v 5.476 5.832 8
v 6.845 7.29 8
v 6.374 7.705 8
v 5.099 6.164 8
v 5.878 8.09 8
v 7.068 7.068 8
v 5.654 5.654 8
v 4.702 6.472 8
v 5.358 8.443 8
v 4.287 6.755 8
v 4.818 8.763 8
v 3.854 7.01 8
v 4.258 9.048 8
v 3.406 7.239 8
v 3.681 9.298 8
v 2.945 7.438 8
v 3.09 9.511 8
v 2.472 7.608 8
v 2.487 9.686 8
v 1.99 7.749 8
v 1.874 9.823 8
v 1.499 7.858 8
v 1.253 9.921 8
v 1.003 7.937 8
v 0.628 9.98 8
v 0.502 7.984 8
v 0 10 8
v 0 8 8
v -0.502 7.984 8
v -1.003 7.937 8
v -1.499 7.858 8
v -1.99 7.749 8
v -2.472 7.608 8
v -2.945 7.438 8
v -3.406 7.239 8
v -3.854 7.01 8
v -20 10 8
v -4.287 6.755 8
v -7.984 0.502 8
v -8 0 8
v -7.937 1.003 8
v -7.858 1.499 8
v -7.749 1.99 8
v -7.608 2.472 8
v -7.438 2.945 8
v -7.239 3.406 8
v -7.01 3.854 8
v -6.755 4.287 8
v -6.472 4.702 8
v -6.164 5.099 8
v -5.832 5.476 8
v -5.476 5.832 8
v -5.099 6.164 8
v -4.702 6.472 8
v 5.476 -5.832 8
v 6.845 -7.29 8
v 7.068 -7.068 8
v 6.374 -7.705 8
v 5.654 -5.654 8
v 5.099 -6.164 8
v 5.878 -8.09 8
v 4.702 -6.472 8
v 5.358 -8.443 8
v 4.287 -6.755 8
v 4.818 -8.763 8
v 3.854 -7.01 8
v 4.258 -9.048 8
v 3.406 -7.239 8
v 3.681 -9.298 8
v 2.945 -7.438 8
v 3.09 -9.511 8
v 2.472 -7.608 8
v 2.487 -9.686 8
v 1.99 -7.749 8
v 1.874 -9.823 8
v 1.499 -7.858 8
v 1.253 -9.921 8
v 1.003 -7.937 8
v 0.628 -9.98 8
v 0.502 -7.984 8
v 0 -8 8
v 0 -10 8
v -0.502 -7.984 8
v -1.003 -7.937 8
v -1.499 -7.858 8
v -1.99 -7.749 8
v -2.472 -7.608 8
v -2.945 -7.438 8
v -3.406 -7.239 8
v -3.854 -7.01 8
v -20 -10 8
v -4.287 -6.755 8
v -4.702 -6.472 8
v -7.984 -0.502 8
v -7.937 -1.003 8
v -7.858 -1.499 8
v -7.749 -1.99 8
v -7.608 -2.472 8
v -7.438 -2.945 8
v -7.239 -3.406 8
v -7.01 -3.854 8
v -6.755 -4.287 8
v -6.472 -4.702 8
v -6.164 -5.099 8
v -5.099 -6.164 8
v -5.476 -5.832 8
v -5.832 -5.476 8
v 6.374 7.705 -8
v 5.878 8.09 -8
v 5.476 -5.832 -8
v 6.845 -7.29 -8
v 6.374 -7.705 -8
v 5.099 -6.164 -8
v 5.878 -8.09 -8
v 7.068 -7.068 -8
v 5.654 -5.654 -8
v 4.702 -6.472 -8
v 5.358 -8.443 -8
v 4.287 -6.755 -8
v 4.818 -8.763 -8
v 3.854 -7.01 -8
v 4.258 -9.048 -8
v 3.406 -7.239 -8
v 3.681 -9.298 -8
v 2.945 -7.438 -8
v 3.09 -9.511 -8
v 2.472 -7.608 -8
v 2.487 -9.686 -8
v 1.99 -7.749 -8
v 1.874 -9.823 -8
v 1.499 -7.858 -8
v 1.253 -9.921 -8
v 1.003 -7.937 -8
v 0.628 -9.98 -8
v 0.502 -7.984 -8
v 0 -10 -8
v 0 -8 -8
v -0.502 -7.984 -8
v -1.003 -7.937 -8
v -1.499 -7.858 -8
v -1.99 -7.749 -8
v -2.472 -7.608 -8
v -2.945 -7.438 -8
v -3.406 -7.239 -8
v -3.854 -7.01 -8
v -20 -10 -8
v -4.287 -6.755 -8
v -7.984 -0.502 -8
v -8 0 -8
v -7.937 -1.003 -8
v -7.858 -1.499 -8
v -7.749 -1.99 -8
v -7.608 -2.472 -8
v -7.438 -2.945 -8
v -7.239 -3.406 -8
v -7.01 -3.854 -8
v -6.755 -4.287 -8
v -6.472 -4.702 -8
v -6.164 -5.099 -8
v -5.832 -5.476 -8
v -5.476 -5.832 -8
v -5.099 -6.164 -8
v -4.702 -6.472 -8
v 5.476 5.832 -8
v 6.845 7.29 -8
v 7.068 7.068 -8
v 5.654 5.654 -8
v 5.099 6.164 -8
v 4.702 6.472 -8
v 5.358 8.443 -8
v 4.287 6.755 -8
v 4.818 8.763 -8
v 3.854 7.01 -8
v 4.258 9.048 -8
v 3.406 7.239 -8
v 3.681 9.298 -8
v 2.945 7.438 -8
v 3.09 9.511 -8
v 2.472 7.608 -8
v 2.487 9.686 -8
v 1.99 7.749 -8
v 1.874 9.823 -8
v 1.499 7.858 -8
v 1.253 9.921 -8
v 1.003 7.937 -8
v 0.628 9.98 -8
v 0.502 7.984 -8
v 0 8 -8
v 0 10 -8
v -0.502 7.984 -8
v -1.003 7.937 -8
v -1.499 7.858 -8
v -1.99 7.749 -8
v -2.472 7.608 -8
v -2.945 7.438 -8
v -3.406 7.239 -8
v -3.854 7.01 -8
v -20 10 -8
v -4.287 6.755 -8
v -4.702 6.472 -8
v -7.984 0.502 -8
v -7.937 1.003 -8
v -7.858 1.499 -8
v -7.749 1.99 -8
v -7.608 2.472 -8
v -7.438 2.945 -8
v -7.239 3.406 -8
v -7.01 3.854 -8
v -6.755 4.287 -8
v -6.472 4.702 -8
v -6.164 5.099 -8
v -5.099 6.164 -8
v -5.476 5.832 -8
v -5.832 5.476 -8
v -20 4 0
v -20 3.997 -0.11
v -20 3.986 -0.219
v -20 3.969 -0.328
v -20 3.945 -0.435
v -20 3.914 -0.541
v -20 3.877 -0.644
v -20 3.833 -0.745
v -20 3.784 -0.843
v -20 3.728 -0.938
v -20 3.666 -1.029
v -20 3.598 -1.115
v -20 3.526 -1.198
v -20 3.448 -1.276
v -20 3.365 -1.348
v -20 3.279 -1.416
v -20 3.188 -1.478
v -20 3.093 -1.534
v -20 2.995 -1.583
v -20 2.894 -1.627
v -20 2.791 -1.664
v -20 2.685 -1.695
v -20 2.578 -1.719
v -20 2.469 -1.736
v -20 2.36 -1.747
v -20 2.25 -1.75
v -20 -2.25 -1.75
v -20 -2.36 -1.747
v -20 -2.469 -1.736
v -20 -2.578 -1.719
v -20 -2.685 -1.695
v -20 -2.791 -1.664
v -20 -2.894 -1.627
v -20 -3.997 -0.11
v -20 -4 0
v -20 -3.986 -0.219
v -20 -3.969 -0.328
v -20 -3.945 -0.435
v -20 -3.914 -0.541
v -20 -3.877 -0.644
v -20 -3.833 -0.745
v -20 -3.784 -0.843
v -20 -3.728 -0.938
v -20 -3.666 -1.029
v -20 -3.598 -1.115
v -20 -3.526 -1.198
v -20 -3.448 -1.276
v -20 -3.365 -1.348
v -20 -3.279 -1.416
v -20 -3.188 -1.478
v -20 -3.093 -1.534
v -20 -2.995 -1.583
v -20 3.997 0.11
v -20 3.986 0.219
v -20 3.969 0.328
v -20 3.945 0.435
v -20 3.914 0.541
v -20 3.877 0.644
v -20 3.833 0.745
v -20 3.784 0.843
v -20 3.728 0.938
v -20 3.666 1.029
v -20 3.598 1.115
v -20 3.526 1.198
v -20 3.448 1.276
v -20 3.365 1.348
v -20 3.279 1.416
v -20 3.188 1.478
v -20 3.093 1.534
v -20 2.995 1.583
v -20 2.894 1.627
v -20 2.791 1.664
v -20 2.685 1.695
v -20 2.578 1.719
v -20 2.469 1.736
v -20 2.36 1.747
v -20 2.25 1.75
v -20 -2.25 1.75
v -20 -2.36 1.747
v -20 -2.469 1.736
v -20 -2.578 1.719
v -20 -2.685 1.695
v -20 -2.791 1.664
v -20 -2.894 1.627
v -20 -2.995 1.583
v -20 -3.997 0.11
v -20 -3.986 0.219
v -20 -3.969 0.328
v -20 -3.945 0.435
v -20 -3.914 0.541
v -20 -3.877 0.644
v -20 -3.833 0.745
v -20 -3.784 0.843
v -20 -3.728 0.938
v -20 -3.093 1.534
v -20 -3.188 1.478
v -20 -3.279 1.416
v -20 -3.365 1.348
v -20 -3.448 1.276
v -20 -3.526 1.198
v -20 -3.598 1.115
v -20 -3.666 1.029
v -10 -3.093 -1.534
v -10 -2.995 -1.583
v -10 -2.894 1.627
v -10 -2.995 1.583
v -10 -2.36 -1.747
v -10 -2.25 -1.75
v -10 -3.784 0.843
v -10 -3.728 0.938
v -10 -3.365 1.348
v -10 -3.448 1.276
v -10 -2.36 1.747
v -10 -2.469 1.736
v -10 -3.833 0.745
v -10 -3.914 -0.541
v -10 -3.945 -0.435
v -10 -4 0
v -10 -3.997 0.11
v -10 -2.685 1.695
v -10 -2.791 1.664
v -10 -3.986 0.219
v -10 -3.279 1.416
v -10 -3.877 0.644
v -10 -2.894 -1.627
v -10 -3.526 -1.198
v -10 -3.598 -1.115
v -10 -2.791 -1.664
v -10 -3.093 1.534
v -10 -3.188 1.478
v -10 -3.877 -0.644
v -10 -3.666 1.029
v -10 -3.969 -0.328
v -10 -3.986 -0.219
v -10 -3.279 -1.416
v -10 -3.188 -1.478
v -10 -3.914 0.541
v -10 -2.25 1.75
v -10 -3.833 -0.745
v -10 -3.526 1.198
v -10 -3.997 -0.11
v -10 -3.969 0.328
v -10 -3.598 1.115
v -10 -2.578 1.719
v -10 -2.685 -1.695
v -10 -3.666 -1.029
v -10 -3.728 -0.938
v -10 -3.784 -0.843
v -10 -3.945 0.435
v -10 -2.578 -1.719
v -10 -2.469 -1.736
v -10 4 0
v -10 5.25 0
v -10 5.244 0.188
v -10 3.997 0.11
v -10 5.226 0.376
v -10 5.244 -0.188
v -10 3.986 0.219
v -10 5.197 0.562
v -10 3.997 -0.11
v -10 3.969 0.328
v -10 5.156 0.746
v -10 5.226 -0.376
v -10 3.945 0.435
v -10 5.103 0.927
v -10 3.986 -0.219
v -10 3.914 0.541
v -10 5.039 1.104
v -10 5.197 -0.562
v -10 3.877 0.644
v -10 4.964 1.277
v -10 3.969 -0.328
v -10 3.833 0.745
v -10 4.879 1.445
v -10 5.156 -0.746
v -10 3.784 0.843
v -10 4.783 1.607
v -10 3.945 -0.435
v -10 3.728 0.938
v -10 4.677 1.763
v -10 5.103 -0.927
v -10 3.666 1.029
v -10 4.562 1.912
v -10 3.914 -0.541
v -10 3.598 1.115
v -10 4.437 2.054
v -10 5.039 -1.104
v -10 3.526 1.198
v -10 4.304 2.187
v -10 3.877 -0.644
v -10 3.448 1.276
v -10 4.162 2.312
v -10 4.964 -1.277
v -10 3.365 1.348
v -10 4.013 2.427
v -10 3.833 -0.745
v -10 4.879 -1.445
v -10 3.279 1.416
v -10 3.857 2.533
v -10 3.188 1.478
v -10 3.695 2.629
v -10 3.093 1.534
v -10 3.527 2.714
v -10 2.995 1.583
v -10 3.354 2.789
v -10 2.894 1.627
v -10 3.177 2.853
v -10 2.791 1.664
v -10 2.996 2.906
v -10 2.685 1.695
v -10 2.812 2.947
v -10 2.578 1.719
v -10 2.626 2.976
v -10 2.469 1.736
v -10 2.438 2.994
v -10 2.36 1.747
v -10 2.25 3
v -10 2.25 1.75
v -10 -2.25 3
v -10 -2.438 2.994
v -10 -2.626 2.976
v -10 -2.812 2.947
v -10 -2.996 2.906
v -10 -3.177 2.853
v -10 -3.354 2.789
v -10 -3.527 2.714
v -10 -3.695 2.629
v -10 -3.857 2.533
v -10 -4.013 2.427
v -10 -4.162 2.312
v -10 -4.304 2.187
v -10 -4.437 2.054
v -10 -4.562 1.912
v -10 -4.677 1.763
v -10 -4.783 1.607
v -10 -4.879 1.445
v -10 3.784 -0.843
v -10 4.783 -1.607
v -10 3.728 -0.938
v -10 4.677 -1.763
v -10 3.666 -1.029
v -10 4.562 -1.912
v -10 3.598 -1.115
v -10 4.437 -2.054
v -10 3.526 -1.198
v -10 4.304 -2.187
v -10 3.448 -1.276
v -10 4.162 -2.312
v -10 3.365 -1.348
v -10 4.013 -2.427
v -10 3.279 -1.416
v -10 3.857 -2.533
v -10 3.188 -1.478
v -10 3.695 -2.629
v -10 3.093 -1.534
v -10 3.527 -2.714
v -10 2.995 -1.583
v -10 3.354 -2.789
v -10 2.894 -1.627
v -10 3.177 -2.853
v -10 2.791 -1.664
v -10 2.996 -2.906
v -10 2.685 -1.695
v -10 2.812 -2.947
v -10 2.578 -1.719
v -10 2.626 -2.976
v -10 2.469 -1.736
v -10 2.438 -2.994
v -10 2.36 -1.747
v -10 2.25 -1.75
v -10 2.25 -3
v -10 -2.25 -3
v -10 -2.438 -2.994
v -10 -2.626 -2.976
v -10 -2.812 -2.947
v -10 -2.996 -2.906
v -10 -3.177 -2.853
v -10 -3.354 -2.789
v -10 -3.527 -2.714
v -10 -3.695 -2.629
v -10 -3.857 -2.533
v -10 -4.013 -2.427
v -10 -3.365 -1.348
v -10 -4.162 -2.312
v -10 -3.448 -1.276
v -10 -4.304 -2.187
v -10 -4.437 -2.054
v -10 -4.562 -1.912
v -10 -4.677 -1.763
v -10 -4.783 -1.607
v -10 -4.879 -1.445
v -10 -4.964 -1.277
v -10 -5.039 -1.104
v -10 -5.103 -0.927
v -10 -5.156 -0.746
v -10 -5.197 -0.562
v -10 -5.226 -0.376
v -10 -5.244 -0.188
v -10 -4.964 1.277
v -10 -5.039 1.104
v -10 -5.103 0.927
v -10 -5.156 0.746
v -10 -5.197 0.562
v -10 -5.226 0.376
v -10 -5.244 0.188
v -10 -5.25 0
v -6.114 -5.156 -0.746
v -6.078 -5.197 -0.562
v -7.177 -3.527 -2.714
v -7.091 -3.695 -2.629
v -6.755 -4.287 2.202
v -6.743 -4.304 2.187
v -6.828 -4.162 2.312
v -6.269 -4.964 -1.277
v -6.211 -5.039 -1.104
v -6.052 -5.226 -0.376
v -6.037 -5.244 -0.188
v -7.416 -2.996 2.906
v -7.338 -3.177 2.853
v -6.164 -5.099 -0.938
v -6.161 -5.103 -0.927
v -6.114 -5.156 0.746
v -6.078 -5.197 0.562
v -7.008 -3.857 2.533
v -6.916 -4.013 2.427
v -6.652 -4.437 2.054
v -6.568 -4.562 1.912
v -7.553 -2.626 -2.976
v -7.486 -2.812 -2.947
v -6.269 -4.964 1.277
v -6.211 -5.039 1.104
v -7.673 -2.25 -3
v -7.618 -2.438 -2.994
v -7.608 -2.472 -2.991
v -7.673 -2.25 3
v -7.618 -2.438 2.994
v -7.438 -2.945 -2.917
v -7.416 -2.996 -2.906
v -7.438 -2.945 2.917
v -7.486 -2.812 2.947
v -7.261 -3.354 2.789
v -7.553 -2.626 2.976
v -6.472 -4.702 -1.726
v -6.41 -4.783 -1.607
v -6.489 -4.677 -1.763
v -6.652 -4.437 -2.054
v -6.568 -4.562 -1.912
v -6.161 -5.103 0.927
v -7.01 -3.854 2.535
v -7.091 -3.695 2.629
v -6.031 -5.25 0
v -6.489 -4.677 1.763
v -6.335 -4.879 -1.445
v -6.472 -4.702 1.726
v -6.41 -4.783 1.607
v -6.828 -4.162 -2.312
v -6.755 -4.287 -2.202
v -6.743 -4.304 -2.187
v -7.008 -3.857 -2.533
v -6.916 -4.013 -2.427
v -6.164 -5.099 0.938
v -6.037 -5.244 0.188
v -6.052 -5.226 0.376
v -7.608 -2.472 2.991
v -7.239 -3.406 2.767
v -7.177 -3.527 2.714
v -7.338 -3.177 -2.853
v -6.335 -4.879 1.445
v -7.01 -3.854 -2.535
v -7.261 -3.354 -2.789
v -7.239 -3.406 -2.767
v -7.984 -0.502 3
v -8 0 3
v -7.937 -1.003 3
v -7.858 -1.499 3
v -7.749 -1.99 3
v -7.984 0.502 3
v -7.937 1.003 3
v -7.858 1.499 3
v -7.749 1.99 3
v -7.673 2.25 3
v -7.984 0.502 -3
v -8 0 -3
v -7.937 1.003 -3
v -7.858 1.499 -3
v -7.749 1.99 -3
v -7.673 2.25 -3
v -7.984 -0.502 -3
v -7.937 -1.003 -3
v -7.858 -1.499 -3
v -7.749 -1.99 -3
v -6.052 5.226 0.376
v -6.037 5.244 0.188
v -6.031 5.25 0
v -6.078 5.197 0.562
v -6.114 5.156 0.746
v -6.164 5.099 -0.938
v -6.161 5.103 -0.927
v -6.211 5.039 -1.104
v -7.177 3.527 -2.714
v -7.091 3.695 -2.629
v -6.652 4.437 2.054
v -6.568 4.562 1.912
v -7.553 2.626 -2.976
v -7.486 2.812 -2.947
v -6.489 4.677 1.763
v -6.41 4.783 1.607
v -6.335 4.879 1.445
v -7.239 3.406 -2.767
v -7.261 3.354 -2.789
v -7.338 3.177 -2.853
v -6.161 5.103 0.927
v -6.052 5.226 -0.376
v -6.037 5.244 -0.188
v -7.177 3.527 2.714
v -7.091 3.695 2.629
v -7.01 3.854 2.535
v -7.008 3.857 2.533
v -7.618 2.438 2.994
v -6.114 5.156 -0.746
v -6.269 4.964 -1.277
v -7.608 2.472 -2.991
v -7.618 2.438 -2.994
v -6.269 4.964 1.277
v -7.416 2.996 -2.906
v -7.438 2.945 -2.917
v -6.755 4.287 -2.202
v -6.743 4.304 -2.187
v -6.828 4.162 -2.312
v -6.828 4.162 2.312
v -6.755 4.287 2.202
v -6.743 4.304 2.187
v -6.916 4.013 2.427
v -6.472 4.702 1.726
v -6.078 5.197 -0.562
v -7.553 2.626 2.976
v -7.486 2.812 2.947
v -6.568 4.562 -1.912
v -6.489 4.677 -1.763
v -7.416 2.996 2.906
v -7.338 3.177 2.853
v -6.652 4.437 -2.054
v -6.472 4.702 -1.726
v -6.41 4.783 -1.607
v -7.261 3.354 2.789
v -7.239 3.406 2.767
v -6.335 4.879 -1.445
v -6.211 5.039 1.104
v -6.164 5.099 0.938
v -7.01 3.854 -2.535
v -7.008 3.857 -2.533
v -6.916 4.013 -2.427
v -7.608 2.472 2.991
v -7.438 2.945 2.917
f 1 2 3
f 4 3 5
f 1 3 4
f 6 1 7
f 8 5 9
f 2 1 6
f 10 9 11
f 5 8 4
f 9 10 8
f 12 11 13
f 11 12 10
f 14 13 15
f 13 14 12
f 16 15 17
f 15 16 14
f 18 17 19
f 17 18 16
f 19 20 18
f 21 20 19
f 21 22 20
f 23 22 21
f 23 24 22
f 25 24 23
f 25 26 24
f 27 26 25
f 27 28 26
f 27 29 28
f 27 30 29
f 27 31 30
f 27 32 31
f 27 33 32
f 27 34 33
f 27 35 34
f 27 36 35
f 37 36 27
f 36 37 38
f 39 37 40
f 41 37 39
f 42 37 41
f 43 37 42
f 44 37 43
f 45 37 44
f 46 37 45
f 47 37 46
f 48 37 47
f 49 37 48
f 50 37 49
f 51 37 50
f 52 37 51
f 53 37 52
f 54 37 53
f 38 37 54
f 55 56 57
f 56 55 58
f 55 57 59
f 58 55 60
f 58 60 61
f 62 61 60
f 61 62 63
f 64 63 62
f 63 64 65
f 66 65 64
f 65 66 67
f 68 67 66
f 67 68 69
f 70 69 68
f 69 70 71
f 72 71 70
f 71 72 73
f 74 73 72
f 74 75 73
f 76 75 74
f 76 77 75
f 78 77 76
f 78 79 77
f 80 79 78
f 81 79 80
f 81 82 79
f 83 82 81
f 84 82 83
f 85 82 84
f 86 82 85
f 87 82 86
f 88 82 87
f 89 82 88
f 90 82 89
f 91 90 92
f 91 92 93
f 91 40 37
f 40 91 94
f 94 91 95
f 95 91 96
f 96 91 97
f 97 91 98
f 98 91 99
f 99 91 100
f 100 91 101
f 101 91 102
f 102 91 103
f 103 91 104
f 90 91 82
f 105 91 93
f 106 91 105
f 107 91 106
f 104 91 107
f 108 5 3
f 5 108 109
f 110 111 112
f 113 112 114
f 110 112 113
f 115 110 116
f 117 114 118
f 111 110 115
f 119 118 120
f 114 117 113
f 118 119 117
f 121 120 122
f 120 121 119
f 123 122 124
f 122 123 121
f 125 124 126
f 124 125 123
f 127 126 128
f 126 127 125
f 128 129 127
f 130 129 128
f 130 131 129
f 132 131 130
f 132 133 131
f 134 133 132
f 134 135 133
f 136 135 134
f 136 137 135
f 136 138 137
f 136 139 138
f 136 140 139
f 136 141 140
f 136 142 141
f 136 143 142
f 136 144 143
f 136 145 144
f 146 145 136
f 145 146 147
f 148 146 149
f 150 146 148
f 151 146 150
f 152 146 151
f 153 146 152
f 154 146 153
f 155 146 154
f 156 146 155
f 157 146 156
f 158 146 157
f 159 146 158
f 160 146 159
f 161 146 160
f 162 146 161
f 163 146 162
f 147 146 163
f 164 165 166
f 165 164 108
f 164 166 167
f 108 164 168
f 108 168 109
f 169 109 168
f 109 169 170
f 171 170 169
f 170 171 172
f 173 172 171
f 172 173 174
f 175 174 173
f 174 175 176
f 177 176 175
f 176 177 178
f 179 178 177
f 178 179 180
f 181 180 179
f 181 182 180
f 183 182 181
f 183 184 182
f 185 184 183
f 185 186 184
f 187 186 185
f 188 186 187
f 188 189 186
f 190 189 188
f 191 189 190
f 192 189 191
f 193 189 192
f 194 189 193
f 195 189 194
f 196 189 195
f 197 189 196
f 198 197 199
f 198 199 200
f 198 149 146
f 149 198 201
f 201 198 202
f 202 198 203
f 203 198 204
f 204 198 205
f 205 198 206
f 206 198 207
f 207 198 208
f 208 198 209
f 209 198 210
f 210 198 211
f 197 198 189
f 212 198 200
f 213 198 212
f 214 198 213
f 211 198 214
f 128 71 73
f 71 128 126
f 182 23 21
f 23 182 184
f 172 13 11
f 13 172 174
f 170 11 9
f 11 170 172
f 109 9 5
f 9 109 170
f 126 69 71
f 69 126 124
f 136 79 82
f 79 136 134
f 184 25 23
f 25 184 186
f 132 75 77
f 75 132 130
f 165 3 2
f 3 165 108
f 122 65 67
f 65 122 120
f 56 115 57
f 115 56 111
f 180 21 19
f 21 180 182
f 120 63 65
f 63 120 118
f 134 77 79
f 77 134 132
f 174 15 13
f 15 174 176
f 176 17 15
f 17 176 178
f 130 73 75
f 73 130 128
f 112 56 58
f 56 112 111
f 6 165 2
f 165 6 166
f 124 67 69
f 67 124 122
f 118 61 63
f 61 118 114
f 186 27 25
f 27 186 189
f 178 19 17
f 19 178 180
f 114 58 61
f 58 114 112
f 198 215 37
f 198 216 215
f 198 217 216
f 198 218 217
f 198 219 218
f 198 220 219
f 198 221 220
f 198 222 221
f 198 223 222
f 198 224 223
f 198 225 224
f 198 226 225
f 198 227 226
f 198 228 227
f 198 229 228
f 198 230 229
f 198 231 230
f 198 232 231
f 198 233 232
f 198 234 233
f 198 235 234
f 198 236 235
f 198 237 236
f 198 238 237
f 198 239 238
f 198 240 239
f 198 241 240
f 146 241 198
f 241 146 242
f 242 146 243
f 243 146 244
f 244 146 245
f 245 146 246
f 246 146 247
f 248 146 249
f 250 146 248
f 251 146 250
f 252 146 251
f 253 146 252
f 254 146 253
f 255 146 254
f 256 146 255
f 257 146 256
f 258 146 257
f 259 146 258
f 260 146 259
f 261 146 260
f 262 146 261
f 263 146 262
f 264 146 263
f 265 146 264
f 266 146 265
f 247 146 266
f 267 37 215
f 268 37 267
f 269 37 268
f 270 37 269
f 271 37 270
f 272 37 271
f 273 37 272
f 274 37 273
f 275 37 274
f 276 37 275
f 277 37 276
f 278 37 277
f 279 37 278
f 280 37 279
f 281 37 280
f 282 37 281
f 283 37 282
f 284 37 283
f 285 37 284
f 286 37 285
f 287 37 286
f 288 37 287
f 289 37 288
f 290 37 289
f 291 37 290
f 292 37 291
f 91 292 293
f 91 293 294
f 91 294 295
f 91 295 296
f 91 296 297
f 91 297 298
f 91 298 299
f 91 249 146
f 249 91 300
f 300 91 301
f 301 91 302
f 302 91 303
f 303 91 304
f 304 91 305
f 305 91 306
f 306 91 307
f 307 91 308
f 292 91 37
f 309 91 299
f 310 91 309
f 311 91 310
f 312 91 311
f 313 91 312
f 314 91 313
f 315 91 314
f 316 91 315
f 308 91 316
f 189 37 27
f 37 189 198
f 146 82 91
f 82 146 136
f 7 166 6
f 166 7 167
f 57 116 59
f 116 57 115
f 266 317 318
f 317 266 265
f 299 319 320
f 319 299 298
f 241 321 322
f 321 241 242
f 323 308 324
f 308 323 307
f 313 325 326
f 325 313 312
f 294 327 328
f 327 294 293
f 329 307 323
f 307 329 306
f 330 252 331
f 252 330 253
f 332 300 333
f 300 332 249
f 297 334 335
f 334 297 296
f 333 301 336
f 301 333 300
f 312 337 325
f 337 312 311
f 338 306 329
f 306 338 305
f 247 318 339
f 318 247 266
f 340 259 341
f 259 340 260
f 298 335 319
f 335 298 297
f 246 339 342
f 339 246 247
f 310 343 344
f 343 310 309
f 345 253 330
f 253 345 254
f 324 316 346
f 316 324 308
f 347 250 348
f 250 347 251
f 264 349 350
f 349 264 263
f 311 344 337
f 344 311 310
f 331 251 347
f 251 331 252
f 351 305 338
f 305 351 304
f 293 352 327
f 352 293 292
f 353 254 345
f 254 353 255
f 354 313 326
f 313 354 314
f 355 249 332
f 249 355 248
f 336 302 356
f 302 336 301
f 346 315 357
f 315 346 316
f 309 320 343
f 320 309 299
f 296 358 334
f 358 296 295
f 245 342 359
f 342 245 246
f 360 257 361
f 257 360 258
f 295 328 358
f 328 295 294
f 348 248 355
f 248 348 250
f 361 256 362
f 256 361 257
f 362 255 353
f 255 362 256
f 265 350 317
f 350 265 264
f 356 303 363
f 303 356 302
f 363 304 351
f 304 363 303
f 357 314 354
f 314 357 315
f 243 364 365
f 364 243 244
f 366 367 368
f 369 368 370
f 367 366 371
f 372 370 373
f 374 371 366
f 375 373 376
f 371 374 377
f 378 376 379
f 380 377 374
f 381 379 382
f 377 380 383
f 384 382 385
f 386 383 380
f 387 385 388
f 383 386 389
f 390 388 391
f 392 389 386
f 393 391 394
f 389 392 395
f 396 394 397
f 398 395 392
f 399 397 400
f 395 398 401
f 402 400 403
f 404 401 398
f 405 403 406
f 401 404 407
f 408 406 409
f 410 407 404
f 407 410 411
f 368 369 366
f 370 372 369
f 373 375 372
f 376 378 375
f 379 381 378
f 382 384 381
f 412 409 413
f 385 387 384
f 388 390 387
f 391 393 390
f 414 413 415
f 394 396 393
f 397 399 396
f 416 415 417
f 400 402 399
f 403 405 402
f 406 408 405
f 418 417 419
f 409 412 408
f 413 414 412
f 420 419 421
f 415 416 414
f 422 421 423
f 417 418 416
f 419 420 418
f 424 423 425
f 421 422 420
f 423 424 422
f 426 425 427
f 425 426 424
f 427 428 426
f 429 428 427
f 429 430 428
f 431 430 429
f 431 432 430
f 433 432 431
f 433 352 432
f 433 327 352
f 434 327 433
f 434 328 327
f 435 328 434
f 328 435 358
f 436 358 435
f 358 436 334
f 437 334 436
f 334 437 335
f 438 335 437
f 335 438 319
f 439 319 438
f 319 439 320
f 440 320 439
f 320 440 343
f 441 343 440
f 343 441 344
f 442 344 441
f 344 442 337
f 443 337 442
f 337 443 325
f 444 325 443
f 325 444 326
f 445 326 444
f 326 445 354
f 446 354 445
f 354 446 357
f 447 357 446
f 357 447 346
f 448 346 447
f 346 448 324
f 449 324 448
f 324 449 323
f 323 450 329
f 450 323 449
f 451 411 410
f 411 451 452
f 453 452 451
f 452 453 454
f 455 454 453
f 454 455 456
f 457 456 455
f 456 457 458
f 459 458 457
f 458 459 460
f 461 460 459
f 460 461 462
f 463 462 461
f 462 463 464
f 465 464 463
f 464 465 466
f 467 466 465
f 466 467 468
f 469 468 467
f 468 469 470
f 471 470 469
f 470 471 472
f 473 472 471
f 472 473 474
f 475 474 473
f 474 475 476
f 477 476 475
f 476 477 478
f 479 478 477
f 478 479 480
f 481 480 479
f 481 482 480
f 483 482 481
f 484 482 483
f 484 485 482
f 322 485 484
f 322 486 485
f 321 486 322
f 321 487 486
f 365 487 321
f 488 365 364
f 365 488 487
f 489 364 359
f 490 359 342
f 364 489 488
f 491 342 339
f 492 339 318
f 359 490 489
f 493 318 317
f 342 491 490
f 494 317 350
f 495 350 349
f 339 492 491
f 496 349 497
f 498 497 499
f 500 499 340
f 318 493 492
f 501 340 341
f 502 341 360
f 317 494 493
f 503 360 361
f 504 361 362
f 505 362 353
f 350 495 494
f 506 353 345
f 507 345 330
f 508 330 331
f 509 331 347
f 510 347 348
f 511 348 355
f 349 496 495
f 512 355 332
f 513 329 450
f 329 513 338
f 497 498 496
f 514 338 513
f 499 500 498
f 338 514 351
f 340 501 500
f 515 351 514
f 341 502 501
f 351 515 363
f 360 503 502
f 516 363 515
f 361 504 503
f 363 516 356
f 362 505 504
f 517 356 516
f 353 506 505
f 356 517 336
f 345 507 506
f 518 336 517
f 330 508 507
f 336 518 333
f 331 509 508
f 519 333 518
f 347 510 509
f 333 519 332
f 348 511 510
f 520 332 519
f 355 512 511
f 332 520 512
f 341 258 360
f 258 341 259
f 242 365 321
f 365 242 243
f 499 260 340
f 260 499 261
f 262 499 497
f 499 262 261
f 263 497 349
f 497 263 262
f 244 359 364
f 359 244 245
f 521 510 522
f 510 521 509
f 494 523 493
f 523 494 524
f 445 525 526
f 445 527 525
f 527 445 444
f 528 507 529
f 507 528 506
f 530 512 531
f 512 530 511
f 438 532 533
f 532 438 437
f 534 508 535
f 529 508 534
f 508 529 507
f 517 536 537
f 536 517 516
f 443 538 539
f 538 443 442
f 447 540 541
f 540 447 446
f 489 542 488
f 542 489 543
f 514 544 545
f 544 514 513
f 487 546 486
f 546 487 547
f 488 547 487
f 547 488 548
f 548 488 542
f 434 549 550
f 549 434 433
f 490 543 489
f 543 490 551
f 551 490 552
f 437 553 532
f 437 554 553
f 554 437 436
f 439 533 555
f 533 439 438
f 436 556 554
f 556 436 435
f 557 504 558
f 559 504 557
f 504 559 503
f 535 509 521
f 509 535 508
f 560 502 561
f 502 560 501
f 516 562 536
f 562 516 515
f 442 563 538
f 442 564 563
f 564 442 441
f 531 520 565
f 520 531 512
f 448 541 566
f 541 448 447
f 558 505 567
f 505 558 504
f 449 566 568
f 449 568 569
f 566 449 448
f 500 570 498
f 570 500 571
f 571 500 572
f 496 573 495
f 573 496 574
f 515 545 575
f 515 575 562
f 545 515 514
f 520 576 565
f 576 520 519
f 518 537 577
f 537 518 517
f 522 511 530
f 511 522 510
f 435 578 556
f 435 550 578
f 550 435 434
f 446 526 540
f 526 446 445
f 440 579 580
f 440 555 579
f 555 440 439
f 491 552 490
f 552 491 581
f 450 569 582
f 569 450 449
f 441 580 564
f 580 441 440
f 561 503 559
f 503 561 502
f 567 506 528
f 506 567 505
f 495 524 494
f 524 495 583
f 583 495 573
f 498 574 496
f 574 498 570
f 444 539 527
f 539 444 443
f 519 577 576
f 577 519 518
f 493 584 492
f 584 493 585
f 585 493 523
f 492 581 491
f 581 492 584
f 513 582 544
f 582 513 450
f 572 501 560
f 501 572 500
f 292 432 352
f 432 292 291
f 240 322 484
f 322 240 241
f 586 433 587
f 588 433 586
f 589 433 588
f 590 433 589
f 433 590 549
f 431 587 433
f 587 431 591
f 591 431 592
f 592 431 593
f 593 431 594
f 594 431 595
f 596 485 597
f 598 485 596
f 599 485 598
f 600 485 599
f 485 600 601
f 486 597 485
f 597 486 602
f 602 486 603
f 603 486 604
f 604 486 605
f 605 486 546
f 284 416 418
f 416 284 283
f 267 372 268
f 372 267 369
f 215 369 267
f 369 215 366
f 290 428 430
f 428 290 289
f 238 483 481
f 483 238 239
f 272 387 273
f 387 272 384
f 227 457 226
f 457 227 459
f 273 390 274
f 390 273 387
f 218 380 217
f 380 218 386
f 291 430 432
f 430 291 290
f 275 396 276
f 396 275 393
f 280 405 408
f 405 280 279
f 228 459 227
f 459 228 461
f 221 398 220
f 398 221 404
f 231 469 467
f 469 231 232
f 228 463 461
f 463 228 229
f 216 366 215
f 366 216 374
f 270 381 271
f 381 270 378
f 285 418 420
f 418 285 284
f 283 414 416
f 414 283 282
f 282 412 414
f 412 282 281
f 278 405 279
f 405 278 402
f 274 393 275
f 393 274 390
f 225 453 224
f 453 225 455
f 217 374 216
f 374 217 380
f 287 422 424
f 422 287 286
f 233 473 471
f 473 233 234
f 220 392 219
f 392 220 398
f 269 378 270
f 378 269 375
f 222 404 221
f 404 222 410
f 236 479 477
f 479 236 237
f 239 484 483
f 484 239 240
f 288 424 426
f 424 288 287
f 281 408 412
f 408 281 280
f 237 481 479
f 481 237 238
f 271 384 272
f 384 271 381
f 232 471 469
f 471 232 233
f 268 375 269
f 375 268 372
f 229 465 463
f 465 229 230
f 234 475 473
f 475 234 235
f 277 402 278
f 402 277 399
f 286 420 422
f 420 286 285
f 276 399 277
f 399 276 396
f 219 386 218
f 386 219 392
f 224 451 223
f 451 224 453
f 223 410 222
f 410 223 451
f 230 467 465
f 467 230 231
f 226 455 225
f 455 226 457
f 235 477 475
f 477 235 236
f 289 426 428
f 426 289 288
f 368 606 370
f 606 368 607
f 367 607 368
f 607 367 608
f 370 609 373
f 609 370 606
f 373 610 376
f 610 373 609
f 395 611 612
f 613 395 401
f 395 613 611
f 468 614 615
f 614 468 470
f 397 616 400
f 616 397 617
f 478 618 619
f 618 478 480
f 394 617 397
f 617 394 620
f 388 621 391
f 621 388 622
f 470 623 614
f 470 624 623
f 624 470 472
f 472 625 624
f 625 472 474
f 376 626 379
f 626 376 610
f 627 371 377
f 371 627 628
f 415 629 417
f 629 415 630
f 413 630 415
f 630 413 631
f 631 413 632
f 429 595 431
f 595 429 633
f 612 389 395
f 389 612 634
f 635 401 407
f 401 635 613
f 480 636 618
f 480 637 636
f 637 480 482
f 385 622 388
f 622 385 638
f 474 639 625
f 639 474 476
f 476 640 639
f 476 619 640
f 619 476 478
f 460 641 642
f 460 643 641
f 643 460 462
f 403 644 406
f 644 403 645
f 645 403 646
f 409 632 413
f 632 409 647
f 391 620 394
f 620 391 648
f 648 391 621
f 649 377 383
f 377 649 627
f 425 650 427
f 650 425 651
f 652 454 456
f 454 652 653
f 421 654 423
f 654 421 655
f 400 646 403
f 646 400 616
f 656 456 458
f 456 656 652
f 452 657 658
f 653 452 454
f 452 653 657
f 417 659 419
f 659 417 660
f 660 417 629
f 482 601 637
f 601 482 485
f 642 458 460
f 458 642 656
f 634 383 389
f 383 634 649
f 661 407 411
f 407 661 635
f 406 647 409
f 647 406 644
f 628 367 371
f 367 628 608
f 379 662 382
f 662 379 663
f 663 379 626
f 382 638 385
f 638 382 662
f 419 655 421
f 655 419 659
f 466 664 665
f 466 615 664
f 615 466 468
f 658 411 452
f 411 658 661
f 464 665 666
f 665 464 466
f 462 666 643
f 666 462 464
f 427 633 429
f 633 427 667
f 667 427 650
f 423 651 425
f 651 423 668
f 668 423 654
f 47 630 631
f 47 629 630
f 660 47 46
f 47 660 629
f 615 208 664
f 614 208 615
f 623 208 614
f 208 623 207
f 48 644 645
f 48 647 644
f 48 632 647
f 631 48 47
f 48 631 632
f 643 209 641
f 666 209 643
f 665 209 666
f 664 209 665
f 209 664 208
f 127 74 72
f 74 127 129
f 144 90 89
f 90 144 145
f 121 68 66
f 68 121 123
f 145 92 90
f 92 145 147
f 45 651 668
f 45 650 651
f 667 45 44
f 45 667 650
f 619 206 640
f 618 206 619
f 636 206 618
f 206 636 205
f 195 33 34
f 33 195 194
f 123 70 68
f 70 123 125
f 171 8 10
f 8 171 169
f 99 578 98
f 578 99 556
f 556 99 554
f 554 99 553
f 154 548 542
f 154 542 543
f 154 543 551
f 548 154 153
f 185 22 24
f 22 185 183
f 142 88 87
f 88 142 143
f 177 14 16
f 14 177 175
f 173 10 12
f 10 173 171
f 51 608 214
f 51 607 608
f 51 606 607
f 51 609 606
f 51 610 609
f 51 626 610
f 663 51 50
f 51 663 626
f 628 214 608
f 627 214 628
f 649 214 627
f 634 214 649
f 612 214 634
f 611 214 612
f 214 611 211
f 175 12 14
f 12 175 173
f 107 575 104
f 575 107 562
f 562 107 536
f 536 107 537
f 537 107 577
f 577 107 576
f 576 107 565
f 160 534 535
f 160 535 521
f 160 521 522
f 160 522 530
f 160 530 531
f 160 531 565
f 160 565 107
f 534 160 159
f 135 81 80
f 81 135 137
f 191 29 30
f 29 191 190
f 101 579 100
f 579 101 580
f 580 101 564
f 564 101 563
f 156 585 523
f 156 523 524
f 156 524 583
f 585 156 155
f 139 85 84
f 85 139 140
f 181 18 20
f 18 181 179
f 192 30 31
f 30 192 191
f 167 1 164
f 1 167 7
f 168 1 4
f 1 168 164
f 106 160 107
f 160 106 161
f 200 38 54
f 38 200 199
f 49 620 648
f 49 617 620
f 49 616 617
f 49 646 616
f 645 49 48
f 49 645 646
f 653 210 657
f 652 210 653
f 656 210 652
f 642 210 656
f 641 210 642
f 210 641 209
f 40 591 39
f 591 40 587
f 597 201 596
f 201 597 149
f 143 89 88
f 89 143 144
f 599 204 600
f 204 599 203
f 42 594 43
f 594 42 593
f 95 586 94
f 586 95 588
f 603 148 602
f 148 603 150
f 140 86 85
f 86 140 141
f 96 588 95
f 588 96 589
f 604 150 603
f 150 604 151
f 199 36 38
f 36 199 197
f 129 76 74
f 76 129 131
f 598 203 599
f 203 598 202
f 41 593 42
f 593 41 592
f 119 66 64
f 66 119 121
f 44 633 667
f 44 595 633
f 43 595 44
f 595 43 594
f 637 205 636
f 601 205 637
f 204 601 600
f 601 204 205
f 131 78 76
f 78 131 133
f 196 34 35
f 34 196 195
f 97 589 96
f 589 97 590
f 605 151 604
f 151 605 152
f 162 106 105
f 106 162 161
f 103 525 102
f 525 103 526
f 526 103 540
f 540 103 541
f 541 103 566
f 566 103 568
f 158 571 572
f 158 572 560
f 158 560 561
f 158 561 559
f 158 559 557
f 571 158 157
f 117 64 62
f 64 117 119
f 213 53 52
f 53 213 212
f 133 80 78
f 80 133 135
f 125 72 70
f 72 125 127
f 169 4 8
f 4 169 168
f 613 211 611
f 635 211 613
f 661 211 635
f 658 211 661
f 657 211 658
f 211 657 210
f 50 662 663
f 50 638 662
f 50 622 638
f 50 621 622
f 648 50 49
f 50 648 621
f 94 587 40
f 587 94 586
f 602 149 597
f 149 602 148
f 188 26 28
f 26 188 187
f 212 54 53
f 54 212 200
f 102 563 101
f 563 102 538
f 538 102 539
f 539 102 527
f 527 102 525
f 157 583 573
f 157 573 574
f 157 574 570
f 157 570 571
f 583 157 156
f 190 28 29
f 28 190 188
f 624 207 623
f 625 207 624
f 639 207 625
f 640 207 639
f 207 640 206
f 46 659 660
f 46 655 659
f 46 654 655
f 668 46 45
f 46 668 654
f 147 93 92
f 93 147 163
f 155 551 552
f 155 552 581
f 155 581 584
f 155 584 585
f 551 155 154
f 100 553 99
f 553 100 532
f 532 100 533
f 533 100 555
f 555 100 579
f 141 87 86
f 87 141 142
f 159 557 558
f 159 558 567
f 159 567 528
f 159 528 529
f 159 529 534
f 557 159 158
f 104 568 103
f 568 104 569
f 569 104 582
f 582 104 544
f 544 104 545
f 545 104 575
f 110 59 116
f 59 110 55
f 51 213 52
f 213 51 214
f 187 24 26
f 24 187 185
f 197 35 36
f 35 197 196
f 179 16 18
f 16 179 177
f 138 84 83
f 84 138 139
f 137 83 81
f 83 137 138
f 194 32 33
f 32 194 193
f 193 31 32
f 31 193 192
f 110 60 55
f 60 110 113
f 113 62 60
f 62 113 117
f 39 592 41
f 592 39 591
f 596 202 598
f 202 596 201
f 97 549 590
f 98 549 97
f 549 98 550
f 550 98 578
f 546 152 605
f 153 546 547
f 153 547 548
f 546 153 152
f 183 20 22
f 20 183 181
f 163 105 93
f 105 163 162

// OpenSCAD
//-----------------------------------------
// Counduit Tube for electric wires Clip
//
// (c) Pedro Barrio 2016
//-----------------------------------------

// Interior diameter
intDiameter  = 16  ;

// Wall Thickness
wallThick    =  2;

// Wall Thickness
wallThick    =  2;

// Open Angle
openAngle    = 90 ;

// Tube Length
clipWide     = 16  ;

// Center Distance
distToCenter  = 20;

// Screw Diameter
screwDiameter  =  3.5;

// Screw Head diameter
screwHeadDiameter = 6;

// Screw Head Heigth
screwHeadHeigth = 2;

// Screw Hole Length
screHoleLength  = 8;

// circle precision
$fn=100;

	difference () {
		union()
		{
		// Clip
		cylinder( clipWide , intDiameter/2 + wallThick , intDiameter/2 + wallThick , center = true);
		// Base 
		translate ([-distToCenter/2,0,0])
			cube ([ distToCenter ,intDiameter+2 * wallThick,clipWide], center = true);
		}
    	cylinder( clipWide , intDiameter/2             , intDiameter/2             , center = true);
		PieSlice (clipWide ,intDiameter/2 + wallThick + 0.1, openAngle);				
		
		translate([-distToCenter /2,0,0])
			rotate([0,90,0])
				rotate(90)
				Hole(distToCenter, screwDiameter, screwHeadDiameter, intDiameter / 2 + screwHeadHeigth, screHoleLength);
	}




// Hole for screw
// ht = totalheigth
// hh = screw Head heigth
// d1 = diameter for screw
// d2 = diameter for screw head

module Hole ( ht = 8, d1 = 3, d2 = 5, hh= 2, l = 10 )
{
	
		// Side 1
		translate ([-(l-d1)/2,0,-hh/2])
			cylinder(ht-hh, d1/2, d1/2, center =  true);
		translate ([-(l-d1)/2,0,(ht-hh)/2])
			cylinder(hh, d2/2, d2/2, center =  true);
		
	

		// Side 2
		translate ([0,0,-hh/2])
			cube ([l-d1,d1,ht-hh], center = true);
		translate ([0,0,(ht-hh)/2])
			cube ([l-d1,d2,hh], center = true);

		// Side 2
		translate ([(l-d1)/2,0,-hh/2])
			cylinder(ht-hh, d1/2, d1/2, center =  true);
		translate ([(l-d1)/2,0,(ht-hh)/2])
			cylinder(hh, d2/2, d2/2, center =  true);
		
}



// Pie sector
module PieSlice(h = 10, r=3.0,a=30) {
	
 	rotate (-a/2) intersection() {
   		cylinder(h, r,r, center =  true);
 	
		translate ([0,0,-h/2]) cube([r,r,h]);
	   rotate(a-90) translate ([0,0,-h/2]) cube([r,r,h]);
  }
} 
